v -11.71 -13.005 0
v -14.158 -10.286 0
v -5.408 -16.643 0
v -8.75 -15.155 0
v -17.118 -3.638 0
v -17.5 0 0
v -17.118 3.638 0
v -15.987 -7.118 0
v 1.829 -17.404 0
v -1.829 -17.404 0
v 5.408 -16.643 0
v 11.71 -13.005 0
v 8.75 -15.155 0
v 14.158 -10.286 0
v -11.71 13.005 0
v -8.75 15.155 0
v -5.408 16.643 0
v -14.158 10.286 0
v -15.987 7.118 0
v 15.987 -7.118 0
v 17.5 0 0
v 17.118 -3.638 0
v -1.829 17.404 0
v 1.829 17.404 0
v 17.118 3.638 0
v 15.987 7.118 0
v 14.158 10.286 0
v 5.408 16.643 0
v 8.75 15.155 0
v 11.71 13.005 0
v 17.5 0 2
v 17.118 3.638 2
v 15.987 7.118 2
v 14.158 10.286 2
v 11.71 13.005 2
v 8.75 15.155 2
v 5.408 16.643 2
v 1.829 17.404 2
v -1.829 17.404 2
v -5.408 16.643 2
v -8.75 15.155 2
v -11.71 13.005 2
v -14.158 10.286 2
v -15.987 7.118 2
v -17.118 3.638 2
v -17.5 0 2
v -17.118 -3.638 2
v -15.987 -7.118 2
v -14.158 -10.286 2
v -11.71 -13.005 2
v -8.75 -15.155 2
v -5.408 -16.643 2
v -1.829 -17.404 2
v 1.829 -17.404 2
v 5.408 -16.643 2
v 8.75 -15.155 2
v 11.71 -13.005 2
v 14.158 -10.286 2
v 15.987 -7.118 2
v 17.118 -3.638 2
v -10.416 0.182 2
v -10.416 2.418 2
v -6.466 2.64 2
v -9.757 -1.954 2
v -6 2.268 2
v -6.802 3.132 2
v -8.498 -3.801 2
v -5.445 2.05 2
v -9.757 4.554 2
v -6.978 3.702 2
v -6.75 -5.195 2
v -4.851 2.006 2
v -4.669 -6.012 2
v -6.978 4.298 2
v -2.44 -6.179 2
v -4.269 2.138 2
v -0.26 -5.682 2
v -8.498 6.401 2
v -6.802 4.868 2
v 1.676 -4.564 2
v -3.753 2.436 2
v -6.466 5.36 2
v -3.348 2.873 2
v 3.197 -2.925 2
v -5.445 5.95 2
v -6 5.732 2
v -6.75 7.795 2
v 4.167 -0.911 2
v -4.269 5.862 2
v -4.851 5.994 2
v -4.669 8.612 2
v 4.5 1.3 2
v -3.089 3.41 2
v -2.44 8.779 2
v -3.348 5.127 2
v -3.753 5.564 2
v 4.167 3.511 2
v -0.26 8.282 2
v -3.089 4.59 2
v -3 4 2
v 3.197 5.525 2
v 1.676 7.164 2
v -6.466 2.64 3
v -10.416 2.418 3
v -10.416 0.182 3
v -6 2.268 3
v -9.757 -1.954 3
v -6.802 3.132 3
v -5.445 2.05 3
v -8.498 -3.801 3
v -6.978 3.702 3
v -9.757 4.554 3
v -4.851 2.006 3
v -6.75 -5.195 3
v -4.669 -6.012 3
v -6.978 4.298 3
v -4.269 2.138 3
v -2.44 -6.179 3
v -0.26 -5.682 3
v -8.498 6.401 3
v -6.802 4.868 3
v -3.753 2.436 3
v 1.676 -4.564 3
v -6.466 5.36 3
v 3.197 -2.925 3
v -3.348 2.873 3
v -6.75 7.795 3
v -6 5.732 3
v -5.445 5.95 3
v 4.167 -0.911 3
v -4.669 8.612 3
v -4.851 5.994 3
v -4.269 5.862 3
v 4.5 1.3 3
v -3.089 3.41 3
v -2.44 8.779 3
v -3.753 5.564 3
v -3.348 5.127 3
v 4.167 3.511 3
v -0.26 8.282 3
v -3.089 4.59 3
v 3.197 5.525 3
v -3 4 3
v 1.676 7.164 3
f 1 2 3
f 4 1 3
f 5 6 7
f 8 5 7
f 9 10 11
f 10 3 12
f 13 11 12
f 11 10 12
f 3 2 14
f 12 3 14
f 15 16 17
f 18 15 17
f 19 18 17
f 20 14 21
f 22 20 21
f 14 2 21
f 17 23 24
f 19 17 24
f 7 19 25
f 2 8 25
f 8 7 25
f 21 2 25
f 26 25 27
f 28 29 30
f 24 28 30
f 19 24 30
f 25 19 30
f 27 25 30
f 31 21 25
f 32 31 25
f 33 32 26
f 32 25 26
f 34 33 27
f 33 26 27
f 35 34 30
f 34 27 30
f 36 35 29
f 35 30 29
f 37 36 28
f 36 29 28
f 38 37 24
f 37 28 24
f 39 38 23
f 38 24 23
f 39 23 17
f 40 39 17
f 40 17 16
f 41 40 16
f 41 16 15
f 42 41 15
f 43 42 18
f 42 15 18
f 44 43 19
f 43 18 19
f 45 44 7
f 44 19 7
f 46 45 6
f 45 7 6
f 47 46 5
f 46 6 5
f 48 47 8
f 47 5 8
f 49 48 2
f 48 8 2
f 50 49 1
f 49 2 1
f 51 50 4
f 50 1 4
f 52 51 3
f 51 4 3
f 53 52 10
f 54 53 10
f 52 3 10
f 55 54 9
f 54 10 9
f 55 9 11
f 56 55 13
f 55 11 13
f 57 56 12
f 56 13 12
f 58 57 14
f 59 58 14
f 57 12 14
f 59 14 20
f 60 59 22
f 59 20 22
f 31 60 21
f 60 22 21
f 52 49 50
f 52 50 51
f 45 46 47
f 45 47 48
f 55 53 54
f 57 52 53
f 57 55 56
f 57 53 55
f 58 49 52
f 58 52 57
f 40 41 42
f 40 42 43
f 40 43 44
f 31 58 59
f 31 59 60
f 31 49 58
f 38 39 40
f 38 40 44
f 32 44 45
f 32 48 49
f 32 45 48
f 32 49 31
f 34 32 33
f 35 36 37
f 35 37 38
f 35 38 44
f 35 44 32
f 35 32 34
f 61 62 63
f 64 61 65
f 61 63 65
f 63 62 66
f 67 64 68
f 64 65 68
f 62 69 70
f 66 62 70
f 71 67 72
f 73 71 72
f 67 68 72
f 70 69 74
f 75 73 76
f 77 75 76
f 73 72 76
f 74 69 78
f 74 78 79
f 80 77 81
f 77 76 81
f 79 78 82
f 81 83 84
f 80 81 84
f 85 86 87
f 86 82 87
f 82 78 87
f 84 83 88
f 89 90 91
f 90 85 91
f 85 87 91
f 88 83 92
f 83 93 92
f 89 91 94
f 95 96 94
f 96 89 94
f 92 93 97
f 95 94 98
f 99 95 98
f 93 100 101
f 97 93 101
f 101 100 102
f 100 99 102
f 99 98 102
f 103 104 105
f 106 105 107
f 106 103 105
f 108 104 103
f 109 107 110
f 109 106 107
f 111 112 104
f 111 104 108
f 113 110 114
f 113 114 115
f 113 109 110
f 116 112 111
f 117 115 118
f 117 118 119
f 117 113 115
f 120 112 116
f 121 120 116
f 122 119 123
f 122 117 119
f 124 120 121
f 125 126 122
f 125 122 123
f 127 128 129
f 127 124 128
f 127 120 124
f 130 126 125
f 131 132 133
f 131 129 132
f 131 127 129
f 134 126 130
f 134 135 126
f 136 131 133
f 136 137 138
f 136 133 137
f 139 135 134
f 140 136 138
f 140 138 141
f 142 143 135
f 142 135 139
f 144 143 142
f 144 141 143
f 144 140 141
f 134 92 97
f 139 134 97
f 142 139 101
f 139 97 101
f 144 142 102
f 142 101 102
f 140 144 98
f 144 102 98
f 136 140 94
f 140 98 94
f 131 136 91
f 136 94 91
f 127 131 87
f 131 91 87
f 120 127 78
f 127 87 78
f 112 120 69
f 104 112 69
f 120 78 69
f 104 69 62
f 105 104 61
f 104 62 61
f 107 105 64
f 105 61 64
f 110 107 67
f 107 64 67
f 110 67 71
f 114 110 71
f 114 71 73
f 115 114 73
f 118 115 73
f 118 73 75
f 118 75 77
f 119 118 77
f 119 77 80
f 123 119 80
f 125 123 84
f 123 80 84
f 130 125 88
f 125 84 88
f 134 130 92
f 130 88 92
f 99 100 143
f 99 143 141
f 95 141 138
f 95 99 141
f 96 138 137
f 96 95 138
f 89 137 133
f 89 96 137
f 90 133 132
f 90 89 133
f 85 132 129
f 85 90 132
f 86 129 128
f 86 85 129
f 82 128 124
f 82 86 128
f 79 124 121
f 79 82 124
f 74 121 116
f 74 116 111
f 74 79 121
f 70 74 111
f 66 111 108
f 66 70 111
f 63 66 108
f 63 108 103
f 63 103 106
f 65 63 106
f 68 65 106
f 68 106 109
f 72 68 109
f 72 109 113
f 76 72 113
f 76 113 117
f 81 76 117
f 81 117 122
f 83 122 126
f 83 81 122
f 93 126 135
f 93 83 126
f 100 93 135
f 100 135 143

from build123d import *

# Parameters (mm, degrees)
SKETCH1_R           = 17.5
BOSS_EXTRUDE1_DEPTH = 2
SKETCH2_R           = 7.5
SKETCH2_R_2         = 2
BOSS_EXTRUDE2_DEPTH = 1


with BuildPart() as part:
    # Sketch1 → Boss-Extrude1 (new body)
    with BuildSketch(Plane.XY):
        Circle(SKETCH1_R)
    extrude(amount=BOSS_EXTRUDE1_DEPTH)


with BuildPart() as body_2:
    # Sketch2 → Boss-Extrude2 (new body)
    with BuildSketch(Plane.XY.offset(2)):
        with Locations((-3, 1.3)):
            Circle(SKETCH2_R)
        with Locations((-5, 4)):
            Circle(SKETCH2_R_2, mode=Mode.SUBTRACT)
    extrude(amount=BOSS_EXTRUDE2_DEPTH)


solid = Compound([part.part, body_2.part])
